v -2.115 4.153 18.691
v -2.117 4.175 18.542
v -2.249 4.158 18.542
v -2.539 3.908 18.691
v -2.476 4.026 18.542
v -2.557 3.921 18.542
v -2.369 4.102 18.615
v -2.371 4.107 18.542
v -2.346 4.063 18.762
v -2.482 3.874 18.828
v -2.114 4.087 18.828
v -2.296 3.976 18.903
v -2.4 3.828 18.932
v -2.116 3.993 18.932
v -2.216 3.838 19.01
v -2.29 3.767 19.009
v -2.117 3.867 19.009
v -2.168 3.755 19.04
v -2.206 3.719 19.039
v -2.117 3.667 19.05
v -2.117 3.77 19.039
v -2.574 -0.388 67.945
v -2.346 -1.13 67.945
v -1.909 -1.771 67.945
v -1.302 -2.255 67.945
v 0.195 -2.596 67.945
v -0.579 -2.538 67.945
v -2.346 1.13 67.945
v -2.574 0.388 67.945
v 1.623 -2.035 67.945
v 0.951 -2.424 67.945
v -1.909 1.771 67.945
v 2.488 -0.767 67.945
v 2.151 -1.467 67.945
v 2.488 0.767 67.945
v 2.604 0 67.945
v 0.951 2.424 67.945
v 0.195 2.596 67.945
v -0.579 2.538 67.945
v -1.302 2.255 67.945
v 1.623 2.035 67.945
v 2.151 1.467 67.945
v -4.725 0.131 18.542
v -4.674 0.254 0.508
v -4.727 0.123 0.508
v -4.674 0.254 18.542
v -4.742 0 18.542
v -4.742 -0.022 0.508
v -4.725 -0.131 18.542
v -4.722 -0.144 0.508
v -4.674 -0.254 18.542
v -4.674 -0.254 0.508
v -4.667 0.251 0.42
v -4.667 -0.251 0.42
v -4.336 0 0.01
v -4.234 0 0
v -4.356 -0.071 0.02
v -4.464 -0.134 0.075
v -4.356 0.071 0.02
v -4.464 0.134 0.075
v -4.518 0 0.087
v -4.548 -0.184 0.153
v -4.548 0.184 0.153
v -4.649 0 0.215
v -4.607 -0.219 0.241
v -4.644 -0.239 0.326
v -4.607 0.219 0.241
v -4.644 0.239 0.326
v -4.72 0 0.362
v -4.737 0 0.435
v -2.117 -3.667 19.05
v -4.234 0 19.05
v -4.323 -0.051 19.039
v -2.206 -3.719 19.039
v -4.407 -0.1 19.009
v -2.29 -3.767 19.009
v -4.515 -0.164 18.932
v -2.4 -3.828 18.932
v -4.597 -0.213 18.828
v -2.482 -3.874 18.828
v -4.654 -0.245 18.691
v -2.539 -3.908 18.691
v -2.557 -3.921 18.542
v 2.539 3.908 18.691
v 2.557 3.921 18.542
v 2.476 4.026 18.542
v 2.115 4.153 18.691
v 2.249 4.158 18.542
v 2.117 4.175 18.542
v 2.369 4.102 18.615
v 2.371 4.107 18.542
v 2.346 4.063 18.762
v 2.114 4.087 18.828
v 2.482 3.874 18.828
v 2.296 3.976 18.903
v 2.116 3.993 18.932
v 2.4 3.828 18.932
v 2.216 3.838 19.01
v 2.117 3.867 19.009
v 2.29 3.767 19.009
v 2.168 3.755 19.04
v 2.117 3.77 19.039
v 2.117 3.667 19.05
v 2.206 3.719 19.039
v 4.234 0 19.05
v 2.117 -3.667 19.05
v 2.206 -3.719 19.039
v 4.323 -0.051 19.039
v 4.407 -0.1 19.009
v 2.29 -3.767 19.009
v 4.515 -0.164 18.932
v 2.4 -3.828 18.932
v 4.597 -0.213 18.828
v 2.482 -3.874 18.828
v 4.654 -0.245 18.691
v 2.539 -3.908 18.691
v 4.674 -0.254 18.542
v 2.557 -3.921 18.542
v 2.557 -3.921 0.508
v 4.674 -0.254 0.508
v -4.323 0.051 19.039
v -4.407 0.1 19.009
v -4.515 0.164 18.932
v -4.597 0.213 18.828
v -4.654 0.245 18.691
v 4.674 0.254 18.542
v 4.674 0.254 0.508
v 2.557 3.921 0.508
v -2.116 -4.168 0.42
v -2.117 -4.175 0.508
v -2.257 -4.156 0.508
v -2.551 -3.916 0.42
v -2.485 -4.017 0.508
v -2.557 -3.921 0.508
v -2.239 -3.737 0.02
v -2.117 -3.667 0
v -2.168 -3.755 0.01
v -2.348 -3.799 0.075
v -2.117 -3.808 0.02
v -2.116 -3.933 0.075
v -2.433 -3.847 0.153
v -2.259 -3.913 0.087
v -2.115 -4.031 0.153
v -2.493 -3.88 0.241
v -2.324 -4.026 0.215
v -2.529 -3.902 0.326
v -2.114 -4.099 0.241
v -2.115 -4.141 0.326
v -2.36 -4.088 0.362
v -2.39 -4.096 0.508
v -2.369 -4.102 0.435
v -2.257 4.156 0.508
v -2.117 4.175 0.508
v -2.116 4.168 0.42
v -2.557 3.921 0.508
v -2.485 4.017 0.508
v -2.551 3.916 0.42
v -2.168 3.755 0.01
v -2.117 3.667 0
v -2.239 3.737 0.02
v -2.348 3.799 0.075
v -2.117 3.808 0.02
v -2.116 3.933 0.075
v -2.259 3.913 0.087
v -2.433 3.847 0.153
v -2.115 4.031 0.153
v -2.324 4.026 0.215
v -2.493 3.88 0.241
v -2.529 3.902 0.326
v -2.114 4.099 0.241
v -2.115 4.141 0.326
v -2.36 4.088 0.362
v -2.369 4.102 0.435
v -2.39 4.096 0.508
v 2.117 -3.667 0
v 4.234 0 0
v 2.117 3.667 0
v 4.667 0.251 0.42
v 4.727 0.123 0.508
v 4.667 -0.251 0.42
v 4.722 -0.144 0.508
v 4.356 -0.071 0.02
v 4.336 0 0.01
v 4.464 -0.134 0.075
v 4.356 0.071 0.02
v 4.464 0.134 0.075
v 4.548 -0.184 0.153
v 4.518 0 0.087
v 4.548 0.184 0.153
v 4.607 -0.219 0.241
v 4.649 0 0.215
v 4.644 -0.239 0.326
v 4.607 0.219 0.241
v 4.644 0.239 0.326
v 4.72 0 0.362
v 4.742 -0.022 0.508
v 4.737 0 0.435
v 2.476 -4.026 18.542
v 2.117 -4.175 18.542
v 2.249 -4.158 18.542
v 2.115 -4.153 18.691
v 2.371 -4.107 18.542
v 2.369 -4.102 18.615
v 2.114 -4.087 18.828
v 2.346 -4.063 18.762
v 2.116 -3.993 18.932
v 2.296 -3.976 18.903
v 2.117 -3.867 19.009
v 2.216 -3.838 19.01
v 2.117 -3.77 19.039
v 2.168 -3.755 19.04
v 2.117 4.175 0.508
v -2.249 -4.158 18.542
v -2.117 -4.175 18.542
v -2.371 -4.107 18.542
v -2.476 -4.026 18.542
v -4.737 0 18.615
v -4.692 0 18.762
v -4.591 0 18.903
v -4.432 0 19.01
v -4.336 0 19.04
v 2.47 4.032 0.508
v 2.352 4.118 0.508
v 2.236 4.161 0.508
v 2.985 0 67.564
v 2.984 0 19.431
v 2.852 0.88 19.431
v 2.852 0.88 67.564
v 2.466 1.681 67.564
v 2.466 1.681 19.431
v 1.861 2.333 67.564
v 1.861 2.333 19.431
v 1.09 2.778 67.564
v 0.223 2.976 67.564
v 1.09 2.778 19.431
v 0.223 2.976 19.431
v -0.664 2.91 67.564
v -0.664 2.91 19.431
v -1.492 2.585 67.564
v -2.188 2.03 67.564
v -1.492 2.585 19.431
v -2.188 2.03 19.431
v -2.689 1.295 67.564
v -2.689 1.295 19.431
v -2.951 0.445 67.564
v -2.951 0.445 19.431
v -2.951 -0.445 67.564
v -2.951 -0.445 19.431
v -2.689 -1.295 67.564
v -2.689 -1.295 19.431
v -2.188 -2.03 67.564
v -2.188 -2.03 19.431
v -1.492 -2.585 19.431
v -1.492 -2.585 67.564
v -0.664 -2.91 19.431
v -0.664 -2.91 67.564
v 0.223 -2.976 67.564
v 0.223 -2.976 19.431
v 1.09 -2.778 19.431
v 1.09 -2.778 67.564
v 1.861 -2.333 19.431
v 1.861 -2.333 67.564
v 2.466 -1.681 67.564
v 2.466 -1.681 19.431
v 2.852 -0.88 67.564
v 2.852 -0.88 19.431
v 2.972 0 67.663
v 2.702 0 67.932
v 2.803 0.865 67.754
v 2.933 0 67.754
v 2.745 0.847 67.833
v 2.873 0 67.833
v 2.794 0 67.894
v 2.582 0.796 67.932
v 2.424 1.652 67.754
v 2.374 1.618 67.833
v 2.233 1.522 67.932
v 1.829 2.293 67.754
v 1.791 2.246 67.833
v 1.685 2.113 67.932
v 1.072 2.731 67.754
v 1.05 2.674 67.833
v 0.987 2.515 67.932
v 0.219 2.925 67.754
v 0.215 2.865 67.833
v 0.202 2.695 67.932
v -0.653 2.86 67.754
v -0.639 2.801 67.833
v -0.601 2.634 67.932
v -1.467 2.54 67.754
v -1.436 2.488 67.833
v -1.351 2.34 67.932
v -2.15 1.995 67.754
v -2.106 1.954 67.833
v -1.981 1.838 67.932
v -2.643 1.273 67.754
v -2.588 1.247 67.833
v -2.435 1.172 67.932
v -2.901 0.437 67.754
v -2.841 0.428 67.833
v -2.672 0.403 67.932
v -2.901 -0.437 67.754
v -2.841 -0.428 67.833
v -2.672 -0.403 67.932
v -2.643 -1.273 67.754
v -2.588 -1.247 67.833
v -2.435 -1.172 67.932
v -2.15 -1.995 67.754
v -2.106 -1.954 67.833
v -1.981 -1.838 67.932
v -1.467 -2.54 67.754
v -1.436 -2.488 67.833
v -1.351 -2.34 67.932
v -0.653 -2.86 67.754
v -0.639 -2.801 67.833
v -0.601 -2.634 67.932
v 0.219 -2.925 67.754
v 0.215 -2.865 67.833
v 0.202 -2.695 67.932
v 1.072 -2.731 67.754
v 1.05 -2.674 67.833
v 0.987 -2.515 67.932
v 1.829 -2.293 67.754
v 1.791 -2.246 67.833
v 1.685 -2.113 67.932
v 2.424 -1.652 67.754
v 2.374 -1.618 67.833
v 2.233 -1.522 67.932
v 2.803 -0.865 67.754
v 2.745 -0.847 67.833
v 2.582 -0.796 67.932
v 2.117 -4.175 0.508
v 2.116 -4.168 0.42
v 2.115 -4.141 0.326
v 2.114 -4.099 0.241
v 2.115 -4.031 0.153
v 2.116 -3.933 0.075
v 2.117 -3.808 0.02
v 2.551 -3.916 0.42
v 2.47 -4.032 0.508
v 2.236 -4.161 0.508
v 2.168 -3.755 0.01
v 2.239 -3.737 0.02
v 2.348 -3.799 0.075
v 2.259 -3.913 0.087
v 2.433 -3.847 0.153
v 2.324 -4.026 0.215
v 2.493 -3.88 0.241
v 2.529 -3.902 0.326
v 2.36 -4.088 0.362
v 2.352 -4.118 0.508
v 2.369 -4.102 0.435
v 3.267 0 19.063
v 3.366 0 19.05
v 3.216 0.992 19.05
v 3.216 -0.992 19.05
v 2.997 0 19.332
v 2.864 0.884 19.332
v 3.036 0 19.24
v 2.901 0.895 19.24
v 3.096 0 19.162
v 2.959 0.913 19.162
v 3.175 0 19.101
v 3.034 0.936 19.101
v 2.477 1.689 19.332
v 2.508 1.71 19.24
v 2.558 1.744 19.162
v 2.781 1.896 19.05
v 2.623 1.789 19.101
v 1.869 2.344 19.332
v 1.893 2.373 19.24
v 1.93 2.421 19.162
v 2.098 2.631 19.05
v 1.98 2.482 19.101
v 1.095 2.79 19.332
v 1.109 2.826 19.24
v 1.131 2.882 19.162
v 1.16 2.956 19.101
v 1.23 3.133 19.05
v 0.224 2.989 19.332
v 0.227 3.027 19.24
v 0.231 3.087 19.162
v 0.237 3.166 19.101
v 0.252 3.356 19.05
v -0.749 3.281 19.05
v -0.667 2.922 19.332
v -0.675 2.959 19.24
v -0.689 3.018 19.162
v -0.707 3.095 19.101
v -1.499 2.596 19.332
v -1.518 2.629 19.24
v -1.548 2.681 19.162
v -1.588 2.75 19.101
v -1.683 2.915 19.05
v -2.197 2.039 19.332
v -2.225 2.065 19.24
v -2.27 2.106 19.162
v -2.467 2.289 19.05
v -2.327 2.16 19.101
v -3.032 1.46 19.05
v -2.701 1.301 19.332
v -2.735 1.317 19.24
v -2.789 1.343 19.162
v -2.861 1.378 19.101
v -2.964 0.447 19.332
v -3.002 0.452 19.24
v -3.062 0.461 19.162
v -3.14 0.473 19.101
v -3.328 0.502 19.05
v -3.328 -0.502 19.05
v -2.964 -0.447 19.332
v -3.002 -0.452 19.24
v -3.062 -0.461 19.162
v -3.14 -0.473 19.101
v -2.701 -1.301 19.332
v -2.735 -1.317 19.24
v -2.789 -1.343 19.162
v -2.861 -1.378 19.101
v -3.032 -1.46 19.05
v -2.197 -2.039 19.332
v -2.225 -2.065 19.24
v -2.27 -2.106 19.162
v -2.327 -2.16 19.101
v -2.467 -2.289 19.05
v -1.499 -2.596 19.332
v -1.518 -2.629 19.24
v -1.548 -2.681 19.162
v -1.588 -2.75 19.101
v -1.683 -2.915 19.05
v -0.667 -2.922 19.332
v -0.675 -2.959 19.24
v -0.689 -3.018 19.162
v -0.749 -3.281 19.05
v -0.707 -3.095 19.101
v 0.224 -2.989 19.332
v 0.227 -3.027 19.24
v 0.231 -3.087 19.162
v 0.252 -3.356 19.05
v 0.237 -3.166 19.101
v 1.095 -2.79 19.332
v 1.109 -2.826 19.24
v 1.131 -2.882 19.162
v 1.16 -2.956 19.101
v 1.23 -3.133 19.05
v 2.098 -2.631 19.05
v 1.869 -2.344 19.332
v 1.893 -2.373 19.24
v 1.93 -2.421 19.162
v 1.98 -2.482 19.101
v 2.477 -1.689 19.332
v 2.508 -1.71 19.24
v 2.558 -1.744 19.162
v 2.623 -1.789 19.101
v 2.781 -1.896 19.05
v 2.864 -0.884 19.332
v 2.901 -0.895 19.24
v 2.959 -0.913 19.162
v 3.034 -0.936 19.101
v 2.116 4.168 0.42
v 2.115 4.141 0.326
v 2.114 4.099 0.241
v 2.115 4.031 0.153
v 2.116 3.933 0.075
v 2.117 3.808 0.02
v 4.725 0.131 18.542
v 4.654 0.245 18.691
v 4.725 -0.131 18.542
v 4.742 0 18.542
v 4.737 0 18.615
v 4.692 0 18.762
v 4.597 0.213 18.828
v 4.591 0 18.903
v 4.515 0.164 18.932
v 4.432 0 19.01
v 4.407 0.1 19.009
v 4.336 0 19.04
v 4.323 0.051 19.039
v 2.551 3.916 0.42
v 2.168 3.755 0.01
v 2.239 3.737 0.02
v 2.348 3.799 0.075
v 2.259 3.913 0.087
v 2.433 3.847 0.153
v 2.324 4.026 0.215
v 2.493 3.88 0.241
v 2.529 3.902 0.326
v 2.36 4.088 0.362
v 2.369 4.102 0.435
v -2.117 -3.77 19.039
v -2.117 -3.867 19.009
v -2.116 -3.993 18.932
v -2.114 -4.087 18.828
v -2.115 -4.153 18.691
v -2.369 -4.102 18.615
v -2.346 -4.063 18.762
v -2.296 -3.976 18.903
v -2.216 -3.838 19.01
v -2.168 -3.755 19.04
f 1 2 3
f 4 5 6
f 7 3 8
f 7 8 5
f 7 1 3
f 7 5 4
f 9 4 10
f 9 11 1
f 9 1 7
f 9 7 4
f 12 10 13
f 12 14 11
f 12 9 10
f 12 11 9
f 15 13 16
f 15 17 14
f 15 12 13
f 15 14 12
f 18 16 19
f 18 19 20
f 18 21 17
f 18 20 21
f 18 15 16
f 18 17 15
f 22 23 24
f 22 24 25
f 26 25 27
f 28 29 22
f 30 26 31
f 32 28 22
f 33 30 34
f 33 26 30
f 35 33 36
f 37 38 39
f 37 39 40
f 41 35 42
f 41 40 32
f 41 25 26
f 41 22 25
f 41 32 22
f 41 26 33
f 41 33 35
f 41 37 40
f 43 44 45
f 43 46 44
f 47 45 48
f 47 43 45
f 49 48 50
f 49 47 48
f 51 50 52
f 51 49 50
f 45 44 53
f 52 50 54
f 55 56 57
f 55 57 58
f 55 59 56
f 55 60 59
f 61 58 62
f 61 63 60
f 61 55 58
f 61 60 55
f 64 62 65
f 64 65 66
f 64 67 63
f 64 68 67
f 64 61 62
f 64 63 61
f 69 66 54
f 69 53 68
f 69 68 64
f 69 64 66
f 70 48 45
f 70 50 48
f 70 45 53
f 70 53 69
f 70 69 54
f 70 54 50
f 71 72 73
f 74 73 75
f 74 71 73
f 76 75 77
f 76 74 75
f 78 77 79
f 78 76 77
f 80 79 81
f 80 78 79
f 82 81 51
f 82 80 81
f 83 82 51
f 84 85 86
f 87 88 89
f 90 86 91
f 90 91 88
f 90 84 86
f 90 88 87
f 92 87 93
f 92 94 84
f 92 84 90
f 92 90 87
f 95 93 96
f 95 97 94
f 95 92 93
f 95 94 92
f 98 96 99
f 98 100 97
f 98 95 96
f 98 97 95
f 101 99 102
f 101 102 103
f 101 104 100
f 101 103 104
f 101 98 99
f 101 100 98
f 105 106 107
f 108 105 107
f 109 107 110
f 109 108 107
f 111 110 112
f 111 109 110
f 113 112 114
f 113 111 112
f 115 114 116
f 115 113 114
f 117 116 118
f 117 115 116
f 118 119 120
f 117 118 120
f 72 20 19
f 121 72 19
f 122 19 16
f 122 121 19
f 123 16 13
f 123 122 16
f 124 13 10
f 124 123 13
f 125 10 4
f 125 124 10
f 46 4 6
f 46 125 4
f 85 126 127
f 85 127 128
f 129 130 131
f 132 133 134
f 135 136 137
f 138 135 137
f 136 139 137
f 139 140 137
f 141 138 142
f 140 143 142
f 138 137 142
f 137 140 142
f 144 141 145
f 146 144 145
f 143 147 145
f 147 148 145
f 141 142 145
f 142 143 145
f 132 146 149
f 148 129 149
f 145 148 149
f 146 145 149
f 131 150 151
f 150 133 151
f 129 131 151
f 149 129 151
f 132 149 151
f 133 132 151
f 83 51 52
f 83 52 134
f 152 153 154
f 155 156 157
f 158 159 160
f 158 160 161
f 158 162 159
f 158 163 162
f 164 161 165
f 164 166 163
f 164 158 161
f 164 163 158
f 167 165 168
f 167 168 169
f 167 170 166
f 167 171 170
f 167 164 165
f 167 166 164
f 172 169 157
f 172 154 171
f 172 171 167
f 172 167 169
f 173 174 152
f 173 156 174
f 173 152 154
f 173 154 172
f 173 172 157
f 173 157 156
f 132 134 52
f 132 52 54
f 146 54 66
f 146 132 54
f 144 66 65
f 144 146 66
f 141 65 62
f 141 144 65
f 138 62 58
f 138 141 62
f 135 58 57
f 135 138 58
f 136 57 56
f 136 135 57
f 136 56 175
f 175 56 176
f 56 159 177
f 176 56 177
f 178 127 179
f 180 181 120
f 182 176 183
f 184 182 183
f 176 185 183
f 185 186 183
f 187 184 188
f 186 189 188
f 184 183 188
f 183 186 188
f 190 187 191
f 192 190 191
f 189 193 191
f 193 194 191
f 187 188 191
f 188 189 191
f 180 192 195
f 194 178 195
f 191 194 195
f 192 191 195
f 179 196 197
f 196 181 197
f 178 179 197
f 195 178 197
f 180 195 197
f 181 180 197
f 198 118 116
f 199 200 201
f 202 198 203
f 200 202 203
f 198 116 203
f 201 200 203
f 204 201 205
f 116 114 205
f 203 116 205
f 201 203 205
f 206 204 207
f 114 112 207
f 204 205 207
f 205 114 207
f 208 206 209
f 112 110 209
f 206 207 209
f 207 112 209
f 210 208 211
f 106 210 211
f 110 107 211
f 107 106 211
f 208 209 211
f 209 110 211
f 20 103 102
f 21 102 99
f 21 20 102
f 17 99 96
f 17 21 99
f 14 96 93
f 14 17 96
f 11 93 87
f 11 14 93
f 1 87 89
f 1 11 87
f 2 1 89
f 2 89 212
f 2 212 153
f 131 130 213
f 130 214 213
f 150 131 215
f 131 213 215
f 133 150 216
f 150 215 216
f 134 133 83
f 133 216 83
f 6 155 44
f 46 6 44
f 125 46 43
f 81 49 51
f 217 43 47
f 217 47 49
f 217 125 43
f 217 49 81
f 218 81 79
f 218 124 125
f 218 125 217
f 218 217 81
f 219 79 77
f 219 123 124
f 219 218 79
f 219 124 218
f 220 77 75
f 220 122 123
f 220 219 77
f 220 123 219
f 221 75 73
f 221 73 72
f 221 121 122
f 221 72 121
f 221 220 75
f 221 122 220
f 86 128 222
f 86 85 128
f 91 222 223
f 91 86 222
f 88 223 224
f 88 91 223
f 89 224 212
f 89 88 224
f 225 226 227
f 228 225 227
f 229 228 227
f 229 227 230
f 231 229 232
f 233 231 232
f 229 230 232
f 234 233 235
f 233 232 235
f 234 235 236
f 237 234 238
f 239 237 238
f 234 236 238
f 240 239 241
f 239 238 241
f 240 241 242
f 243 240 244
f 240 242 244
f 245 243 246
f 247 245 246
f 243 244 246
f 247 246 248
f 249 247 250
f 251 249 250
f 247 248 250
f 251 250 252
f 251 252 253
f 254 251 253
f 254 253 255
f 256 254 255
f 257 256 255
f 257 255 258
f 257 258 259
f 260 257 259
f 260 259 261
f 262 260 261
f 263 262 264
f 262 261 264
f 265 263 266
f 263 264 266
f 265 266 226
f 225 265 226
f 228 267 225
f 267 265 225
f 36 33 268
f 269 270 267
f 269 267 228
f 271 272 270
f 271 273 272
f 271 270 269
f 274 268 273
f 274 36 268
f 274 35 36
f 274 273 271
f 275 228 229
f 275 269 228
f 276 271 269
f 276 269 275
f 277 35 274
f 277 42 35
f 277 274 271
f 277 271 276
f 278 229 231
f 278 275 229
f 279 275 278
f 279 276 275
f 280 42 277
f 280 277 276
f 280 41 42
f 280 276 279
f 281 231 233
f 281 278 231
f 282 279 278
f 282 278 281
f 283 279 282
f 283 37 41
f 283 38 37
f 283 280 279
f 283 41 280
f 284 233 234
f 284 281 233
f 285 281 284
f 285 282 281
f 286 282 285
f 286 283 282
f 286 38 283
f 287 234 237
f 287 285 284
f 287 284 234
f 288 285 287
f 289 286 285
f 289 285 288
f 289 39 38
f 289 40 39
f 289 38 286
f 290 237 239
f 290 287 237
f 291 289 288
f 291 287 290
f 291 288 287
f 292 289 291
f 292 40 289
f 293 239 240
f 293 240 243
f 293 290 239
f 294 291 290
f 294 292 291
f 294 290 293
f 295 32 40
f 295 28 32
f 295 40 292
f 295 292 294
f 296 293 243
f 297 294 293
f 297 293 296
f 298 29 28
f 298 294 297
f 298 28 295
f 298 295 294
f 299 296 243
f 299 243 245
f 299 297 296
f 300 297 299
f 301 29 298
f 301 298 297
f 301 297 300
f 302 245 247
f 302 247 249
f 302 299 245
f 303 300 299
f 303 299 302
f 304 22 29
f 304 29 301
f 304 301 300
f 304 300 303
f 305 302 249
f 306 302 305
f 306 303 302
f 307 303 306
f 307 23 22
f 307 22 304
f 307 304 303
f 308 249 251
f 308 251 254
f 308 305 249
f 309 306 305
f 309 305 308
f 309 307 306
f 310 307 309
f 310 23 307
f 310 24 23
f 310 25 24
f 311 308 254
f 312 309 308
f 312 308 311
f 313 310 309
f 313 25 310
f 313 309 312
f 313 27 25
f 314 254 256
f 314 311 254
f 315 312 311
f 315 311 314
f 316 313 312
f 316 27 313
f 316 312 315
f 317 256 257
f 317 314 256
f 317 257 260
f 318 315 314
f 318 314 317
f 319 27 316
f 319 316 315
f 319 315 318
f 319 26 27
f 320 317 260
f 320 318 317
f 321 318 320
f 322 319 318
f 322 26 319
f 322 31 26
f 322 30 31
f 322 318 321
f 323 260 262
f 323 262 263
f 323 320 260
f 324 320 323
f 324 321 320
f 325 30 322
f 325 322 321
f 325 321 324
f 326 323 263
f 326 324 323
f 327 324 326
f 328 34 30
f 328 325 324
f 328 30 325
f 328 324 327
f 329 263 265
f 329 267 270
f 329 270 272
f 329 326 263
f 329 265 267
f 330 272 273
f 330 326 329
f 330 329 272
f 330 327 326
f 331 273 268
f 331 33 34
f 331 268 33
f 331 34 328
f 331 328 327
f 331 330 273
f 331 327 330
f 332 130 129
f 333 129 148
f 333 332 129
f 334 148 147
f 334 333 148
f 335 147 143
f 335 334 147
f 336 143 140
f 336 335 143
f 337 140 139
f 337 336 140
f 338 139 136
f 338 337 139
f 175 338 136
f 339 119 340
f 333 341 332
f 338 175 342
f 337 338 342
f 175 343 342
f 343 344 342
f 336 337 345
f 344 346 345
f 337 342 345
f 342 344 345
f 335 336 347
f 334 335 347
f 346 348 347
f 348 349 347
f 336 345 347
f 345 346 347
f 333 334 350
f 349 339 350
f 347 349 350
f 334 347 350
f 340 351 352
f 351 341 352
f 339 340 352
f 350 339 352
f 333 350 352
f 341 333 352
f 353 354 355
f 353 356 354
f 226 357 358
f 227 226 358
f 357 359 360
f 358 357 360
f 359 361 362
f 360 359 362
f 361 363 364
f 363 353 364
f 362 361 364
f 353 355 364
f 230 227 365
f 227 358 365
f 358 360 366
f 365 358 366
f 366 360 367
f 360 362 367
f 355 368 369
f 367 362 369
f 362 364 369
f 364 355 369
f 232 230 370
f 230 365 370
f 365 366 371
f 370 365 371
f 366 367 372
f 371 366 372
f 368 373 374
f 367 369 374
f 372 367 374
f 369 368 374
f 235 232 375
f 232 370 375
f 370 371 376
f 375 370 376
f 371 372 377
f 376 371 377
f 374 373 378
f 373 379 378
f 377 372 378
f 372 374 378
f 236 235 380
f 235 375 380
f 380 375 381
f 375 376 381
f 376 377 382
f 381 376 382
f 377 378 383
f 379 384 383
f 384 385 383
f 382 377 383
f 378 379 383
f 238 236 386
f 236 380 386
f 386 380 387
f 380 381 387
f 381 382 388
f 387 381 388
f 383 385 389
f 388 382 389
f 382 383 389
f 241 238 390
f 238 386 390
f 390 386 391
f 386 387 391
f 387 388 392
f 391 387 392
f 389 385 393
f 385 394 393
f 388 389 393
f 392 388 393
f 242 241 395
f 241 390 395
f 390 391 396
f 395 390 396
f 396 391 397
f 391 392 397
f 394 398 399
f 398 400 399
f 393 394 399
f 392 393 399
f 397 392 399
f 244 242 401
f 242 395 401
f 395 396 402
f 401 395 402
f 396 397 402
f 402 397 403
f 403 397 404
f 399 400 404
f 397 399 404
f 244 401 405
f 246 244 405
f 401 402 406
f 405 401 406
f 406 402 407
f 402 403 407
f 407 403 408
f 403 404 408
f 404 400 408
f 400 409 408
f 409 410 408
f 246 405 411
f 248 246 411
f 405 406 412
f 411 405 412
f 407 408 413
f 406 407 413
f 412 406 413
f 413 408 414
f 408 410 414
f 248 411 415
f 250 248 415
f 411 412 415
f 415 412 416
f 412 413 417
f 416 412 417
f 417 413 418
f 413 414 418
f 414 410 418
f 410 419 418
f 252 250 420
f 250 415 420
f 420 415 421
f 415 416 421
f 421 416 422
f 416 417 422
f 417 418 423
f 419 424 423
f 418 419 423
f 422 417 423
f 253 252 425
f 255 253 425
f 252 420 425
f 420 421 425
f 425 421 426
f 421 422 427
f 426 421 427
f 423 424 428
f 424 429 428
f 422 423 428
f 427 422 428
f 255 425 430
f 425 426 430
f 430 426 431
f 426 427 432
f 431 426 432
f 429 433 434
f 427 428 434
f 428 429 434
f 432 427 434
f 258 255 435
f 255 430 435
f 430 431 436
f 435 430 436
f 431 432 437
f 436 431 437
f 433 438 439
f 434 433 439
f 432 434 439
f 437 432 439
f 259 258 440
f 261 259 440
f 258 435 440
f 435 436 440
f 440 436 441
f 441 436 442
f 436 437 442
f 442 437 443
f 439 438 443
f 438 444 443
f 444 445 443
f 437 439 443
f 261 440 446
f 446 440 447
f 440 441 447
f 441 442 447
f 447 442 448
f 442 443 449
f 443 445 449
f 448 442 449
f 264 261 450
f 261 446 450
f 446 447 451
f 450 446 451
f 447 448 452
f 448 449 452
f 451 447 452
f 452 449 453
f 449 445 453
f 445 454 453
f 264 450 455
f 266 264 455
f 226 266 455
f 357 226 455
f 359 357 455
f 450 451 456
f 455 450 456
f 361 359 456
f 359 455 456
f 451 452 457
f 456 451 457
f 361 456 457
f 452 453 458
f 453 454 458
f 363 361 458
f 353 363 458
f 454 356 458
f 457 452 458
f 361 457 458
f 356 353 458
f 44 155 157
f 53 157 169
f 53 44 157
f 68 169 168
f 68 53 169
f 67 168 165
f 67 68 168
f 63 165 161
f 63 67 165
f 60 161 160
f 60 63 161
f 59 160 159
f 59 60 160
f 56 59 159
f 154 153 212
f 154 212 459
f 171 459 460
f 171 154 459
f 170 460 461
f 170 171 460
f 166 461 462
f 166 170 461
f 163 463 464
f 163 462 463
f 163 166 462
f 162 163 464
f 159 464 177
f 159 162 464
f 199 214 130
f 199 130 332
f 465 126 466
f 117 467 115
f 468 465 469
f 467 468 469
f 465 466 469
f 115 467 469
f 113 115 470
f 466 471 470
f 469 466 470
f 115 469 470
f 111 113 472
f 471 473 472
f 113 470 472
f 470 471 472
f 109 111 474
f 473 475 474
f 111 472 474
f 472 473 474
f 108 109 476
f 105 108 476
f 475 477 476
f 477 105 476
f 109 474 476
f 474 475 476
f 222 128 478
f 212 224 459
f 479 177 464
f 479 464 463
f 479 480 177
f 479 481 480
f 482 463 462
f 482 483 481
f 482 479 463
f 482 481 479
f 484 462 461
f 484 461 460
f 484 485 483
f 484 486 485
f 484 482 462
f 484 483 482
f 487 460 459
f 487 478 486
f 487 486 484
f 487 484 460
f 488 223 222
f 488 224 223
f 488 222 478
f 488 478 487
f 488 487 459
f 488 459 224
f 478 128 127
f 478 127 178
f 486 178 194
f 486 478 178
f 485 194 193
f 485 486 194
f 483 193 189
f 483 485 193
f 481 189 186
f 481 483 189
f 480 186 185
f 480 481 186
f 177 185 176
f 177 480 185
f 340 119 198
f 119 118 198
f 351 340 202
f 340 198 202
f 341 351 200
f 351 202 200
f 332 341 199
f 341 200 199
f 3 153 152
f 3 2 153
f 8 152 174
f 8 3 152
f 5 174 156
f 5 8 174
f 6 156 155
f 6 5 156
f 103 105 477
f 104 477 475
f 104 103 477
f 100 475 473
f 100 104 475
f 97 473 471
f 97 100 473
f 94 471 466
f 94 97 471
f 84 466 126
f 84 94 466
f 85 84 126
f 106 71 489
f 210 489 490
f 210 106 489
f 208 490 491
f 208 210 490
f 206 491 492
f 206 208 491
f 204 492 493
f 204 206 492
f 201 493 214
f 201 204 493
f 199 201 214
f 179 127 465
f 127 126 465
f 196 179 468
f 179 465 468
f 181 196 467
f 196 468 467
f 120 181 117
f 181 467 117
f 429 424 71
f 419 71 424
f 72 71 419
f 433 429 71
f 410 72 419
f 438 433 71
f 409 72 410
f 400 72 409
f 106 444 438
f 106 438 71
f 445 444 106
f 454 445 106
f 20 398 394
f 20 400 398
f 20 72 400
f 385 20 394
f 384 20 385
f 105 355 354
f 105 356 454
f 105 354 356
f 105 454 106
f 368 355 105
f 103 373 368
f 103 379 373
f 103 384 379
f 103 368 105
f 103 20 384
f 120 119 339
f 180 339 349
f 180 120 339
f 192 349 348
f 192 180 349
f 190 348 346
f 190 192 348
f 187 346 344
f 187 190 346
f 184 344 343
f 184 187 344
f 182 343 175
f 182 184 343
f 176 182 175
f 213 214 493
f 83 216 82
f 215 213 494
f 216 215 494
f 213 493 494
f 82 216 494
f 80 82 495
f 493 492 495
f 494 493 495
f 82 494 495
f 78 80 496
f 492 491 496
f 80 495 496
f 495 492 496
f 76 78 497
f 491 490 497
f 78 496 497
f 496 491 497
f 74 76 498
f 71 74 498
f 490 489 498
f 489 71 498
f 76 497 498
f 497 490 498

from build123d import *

# Parameters (mm, degrees)
BOSS_EXTRUDE1_DEPTH = 19.05
SKETCH2_R           = 2.9845
BOSS_EXTRUDE2_DEPTH = 48.895
FILLET1_R           = 0.381
FILLET2_R           = 0.381
FILLET3_R           = 0.508
FILLET4_R           = 0.508


with BuildPart() as part:
    # Sketch1 → Boss-Extrude1 (new body)
    with BuildSketch(Plane.XY):
        Polygon((2.410509543, -4.175125), (4.821019085, 0), (2.410509543, 4.175125), (-2.410509543, 4.175125), (-4.821019085, 0), (-2.410509543, -4.175125), align=None)
    extrude(amount=BOSS_EXTRUDE1_DEPTH)

    # Sketch2 → Boss-Extrude2 (add)
    with BuildSketch(Plane.XY.offset(19.05)):
        Circle(SKETCH2_R)
    extrude(amount=BOSS_EXTRUDE2_DEPTH)

    # Fillet1
    fillet1_edges = [part.edges().sort_by_distance(p)[0] for p in [
        (-2.9845, 0, 67.945),
    ]]
    fillet(fillet1_edges, radius=FILLET1_R)

    # Fillet2
    fillet2_edges = [part.edges().sort_by_distance(p)[0] for p in [
        (-2.9845, 0, 19.05),
    ]]
    fillet(fillet2_edges, radius=FILLET2_R)

    # Fillet3
    fillet3_edges = [part.edges().sort_by_distance(p)[0] for p in [
        (3.615764314, 2.0875625, 19.05),
        (0, 4.175125, 19.05),
        (-3.615764314, 2.0875625, 19.05),
        (-3.615764314, -2.0875625, 19.05),
        (0, -4.175125, 19.05),
        (-3.615764314, -2.0875625, 0),
        (-3.615764314, 2.0875625, 0),
        (0, 4.175125, 0),
        (3.615764314, 2.0875625, 0),
        (3.615764314, -2.0875625, 0),
        (0, -4.175125, 0),
        (3.615764314, -2.0875625, 19.05),
    ]]
    fillet(fillet3_edges, radius=FILLET3_R)

    # Fillet4
    fillet4_edges = [part.edges().sort_by_distance(p)[0] for p in [
        (4.821019085, 0, 9.525),
        (2.410509543, -4.175125, 9.525),
        (2.410509543, 4.175125, 9.525),
        (-2.410509543, -4.175125, 9.525),
        (-2.410509543, 4.175125, 9.525),
        (-4.821019085, 0, 9.525),
        (-4.634149245, 0, 0.136202851),
        (-2.317074623, 4.013290972, 0.136202851),
        (-2.317074623, -4.013290972, 0.136202851),
        (2.317074623, 4.013290972, 0.136202851),
        (2.317074623, -4.013290972, 0.136202851),
        (4.634149245, 0, 0.136202851),
        (-2.317074623, -4.013290972, 18.913797149),
        (-4.634149245, 0, 18.913797149),
        (2.317074623, -4.013290972, 18.913797149),
        (-2.317074623, 4.013290972, 18.913797149),
        (4.634149245, 0, 18.913797149),
        (2.317074623, 4.013290972, 18.913797149),
    ]]
    fillet(fillet4_edges, radius=FILLET4_R)


solid = part.part
